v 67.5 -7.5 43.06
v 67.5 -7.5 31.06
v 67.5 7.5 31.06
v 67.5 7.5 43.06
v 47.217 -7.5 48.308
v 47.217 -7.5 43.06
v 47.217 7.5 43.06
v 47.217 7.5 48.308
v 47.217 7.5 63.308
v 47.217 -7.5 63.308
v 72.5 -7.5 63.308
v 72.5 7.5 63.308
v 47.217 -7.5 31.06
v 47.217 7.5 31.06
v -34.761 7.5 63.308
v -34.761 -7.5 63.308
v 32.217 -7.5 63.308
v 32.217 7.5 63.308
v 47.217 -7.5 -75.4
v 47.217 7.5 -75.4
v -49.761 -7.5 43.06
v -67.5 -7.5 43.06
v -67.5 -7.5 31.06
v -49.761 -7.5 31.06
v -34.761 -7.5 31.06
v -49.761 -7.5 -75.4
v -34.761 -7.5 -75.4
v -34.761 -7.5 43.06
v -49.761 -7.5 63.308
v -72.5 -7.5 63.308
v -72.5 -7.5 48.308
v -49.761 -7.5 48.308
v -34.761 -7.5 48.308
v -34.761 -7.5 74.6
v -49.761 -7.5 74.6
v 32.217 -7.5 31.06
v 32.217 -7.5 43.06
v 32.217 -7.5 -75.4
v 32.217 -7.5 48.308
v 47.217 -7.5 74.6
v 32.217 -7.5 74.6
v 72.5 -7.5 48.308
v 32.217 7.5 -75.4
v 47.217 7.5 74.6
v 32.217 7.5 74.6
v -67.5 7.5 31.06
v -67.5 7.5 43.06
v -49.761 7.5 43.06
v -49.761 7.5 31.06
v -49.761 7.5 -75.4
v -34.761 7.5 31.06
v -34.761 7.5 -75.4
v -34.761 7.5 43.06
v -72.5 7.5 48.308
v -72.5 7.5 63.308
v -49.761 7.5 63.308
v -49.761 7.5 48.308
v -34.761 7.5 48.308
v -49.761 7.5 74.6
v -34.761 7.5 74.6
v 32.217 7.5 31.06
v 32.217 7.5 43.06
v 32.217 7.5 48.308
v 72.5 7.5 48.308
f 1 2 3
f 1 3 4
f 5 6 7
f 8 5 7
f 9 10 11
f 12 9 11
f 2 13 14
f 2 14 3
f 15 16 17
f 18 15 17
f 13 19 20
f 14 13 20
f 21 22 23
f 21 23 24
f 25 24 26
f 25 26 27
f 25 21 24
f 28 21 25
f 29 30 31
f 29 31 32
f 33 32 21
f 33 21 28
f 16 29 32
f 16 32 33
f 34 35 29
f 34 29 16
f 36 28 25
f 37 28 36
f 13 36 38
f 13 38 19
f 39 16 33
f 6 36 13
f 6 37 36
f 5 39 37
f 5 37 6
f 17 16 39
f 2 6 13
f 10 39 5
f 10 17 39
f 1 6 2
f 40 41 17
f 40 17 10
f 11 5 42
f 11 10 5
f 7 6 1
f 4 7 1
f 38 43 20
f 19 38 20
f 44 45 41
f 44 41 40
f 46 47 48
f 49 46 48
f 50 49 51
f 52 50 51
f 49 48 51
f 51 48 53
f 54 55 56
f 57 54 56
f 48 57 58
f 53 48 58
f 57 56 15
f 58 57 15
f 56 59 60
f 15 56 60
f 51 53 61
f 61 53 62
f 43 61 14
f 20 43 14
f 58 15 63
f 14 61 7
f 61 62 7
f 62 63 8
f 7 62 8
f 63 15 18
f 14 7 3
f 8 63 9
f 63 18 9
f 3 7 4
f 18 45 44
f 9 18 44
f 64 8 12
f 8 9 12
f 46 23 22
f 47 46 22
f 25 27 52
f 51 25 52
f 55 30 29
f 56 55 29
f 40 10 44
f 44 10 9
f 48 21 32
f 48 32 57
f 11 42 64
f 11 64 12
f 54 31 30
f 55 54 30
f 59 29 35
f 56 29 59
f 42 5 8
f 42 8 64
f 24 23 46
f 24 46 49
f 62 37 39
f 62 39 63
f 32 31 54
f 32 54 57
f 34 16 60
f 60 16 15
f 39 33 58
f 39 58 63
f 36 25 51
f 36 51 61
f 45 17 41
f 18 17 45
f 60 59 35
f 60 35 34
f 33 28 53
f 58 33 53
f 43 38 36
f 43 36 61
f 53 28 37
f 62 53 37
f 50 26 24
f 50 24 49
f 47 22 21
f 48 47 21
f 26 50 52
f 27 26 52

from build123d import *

# Parameters (mm, degrees)
F0_W     = 15
F0_H     = 15
F1_DEPTH = 150
F3_W     = 135
F3_H     = 12
F4_DEPTH = 7.5
F5_W     = 145
F5_H     = 15
F6_DEPTH = 7.5


with BuildPart() as f1:
    # F0 (on Top) → F1 (new body)
    with BuildSketch(Plane.XY):
        with Locations((-42.26087, 0)):
            Rectangle(F0_W, F0_H)
        with Locations((39.717395, 0)):
            Rectangle(F0_W, F0_H)
    extrude(amount=F1_DEPTH)


with BuildPart() as f1_1:
    # F2: moved
    add(f1.part.moved(Location((0, 0, -75.4))))

    # F3 (on Front) → F4 (join, symmetric)
    with BuildSketch(Plane.XZ):
        with Locations((0, 37.059784)):
            Rectangle(F3_W, F3_H)
    extrude(amount=F4_DEPTH, both=True)

    # F5 (on Front) → F6 (join, symmetric)
    with BuildSketch(Plane.XZ):
        with Locations((0, 55.807658)):
            Rectangle(F5_W, F5_H)
    extrude(amount=F6_DEPTH, both=True)


solid = f1_1.part
